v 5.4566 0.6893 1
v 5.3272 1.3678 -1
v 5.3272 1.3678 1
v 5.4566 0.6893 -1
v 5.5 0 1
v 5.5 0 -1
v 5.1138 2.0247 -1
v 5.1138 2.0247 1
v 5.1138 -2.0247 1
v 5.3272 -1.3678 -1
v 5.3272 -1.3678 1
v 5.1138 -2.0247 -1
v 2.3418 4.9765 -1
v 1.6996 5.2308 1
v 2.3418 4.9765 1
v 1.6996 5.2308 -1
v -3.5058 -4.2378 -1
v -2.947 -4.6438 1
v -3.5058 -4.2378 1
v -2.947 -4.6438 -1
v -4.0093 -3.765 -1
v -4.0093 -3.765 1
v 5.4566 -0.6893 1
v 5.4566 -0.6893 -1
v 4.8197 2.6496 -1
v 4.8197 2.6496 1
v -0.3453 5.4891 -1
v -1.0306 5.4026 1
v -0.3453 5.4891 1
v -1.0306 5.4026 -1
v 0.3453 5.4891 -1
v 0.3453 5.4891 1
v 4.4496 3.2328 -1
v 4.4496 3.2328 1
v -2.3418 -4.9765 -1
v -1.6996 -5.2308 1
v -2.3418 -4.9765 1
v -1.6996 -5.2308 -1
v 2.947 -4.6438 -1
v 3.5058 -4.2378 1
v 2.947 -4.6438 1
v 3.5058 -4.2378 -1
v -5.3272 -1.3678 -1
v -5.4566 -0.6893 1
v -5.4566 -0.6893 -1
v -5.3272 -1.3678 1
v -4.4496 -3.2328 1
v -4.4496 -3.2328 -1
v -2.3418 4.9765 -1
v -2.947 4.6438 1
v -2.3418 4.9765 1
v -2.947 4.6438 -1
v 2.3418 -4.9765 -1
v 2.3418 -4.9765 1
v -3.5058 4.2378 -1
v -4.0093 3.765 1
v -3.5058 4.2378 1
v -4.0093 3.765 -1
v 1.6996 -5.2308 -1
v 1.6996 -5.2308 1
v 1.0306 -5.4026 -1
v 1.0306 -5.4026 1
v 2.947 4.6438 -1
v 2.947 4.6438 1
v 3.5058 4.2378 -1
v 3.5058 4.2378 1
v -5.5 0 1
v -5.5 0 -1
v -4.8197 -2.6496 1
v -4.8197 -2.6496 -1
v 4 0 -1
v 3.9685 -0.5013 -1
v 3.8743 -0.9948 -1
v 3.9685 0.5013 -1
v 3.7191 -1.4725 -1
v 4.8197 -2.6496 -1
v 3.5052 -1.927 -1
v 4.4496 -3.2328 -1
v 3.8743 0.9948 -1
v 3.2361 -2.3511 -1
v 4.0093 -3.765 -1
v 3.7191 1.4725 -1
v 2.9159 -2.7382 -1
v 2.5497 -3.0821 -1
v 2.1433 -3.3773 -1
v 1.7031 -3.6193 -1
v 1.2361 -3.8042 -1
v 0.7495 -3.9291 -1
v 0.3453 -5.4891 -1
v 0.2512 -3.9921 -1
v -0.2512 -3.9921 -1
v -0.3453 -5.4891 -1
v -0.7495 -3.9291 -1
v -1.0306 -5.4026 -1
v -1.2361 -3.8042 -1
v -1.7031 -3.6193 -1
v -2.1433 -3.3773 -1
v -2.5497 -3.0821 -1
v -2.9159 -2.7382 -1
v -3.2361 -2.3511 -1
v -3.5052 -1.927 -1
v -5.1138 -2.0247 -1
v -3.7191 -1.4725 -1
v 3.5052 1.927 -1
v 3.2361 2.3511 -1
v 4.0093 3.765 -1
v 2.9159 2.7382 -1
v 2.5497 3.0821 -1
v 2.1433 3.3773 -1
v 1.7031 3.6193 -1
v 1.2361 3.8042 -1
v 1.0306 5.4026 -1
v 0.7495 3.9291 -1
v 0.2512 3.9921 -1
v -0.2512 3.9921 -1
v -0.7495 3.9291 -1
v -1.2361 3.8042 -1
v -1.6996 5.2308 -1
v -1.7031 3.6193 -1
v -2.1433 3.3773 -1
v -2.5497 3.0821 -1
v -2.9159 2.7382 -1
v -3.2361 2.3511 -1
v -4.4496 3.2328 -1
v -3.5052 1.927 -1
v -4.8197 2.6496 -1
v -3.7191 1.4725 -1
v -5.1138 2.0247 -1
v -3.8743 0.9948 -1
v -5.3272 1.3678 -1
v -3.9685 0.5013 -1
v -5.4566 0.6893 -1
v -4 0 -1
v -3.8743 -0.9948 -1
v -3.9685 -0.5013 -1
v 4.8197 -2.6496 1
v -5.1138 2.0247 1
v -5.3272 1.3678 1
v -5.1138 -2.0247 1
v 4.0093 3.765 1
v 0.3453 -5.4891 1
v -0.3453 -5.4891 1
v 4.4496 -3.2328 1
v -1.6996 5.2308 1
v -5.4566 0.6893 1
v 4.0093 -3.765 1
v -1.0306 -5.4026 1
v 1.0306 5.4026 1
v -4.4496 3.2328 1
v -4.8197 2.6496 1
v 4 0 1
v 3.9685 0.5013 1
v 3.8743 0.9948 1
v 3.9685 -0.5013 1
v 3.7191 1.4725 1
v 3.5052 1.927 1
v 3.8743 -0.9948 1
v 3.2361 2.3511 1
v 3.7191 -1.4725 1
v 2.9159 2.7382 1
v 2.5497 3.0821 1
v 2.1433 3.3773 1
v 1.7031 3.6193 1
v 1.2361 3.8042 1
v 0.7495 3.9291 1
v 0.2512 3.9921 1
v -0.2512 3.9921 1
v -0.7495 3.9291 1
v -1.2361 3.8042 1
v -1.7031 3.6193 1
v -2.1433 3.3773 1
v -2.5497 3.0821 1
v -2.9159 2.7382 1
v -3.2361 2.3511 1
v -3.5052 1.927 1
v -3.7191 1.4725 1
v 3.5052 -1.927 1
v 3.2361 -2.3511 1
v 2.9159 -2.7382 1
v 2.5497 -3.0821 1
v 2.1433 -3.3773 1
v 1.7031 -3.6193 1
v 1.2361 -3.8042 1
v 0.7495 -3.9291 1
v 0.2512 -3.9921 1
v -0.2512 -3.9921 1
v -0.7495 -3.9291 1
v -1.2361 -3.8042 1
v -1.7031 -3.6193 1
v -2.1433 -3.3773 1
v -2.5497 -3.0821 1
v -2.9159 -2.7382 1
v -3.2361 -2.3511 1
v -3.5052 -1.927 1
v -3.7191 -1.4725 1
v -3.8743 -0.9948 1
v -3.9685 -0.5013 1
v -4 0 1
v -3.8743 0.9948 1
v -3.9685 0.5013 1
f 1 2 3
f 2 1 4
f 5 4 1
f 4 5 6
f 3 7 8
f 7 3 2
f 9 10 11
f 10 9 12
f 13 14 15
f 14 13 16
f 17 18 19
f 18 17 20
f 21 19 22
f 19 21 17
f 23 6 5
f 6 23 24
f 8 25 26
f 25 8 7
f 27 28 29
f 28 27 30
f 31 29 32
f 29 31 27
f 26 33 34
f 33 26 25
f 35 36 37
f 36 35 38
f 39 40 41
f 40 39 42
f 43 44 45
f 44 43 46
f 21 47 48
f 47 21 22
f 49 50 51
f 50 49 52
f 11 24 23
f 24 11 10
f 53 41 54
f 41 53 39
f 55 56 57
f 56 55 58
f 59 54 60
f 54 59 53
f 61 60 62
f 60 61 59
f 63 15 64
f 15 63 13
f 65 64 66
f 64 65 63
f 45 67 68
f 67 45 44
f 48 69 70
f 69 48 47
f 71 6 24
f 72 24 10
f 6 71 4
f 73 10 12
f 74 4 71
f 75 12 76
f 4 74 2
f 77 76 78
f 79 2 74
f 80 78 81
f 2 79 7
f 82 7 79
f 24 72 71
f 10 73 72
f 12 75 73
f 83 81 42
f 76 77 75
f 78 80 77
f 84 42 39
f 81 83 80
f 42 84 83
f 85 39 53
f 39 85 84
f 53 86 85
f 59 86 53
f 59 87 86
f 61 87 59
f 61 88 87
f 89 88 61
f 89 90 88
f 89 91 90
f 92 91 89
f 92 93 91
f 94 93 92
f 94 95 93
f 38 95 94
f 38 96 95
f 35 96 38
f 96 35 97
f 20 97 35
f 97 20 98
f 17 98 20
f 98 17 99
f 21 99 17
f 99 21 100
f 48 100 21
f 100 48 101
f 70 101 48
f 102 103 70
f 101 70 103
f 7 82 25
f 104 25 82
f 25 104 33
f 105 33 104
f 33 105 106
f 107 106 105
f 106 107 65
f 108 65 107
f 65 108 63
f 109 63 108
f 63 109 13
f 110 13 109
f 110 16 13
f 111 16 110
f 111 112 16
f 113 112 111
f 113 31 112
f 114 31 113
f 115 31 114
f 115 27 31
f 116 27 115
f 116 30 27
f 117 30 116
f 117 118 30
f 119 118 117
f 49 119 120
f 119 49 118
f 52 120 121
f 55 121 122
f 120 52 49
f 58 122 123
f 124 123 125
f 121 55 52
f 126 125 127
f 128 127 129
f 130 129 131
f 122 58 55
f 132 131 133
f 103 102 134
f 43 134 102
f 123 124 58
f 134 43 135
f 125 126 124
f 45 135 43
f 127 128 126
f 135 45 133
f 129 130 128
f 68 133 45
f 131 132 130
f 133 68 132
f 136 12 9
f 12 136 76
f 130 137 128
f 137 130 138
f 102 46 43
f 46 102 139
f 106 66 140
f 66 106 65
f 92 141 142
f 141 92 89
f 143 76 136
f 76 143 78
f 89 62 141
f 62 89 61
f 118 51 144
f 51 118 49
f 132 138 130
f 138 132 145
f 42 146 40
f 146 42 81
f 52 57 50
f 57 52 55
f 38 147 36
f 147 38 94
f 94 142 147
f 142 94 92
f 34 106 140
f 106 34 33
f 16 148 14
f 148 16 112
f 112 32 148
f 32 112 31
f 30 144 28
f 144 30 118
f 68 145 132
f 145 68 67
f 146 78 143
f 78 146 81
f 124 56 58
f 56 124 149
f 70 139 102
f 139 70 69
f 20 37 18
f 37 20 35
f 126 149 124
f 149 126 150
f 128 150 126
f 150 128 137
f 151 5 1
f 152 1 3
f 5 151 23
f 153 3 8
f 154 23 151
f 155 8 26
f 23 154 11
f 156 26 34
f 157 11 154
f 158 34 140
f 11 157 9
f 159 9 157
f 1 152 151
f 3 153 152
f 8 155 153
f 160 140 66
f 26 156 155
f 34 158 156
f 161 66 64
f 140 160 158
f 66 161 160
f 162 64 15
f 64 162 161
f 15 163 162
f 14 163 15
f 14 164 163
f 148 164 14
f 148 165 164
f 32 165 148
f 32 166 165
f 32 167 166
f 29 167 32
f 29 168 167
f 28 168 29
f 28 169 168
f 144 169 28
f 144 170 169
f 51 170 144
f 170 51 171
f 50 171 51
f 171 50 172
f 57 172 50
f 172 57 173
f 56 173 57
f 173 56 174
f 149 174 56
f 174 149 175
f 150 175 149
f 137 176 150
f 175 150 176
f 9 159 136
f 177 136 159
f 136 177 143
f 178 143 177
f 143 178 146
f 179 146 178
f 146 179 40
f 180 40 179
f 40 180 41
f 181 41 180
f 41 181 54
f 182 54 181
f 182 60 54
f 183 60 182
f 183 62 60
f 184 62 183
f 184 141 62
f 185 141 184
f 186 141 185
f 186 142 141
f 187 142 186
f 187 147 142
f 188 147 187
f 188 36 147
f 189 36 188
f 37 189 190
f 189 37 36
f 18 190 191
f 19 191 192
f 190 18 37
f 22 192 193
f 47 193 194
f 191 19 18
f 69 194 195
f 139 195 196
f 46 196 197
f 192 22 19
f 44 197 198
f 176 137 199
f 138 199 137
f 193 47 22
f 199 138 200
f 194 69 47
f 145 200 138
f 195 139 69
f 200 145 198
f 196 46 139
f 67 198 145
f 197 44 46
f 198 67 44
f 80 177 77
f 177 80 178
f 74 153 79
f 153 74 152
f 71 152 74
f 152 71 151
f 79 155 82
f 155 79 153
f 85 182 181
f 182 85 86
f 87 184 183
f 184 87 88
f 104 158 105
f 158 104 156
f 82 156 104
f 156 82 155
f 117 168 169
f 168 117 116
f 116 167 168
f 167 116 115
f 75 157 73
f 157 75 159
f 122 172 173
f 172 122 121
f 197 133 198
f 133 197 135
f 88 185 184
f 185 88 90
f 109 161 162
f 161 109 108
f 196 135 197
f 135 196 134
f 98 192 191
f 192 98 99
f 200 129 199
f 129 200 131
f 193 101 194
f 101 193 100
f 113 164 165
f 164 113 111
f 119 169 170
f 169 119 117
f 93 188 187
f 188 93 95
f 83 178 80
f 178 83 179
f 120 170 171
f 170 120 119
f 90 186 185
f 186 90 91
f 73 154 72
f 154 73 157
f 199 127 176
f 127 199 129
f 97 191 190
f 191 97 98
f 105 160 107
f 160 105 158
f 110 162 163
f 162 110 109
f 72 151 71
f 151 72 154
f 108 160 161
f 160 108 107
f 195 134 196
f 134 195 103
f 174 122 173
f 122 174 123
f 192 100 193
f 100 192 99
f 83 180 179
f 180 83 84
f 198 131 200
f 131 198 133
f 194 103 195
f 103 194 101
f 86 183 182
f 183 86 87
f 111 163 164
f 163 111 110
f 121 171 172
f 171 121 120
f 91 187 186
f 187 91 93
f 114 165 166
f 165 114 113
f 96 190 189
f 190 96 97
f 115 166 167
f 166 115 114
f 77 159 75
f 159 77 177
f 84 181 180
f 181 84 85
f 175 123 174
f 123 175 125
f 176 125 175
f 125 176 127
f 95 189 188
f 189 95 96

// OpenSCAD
$fn = 50;


difference() {
	union() {
		translate(v = [0, 0, -1.0000000000]) {
			cylinder(h = 2, r = 5.5000000000);
		}
	}
	union() {
		translate(v = [0, 0, -100.0000000000]) {
			cylinder(h = 200, r = 4.0000000000);
		}
	}
}
